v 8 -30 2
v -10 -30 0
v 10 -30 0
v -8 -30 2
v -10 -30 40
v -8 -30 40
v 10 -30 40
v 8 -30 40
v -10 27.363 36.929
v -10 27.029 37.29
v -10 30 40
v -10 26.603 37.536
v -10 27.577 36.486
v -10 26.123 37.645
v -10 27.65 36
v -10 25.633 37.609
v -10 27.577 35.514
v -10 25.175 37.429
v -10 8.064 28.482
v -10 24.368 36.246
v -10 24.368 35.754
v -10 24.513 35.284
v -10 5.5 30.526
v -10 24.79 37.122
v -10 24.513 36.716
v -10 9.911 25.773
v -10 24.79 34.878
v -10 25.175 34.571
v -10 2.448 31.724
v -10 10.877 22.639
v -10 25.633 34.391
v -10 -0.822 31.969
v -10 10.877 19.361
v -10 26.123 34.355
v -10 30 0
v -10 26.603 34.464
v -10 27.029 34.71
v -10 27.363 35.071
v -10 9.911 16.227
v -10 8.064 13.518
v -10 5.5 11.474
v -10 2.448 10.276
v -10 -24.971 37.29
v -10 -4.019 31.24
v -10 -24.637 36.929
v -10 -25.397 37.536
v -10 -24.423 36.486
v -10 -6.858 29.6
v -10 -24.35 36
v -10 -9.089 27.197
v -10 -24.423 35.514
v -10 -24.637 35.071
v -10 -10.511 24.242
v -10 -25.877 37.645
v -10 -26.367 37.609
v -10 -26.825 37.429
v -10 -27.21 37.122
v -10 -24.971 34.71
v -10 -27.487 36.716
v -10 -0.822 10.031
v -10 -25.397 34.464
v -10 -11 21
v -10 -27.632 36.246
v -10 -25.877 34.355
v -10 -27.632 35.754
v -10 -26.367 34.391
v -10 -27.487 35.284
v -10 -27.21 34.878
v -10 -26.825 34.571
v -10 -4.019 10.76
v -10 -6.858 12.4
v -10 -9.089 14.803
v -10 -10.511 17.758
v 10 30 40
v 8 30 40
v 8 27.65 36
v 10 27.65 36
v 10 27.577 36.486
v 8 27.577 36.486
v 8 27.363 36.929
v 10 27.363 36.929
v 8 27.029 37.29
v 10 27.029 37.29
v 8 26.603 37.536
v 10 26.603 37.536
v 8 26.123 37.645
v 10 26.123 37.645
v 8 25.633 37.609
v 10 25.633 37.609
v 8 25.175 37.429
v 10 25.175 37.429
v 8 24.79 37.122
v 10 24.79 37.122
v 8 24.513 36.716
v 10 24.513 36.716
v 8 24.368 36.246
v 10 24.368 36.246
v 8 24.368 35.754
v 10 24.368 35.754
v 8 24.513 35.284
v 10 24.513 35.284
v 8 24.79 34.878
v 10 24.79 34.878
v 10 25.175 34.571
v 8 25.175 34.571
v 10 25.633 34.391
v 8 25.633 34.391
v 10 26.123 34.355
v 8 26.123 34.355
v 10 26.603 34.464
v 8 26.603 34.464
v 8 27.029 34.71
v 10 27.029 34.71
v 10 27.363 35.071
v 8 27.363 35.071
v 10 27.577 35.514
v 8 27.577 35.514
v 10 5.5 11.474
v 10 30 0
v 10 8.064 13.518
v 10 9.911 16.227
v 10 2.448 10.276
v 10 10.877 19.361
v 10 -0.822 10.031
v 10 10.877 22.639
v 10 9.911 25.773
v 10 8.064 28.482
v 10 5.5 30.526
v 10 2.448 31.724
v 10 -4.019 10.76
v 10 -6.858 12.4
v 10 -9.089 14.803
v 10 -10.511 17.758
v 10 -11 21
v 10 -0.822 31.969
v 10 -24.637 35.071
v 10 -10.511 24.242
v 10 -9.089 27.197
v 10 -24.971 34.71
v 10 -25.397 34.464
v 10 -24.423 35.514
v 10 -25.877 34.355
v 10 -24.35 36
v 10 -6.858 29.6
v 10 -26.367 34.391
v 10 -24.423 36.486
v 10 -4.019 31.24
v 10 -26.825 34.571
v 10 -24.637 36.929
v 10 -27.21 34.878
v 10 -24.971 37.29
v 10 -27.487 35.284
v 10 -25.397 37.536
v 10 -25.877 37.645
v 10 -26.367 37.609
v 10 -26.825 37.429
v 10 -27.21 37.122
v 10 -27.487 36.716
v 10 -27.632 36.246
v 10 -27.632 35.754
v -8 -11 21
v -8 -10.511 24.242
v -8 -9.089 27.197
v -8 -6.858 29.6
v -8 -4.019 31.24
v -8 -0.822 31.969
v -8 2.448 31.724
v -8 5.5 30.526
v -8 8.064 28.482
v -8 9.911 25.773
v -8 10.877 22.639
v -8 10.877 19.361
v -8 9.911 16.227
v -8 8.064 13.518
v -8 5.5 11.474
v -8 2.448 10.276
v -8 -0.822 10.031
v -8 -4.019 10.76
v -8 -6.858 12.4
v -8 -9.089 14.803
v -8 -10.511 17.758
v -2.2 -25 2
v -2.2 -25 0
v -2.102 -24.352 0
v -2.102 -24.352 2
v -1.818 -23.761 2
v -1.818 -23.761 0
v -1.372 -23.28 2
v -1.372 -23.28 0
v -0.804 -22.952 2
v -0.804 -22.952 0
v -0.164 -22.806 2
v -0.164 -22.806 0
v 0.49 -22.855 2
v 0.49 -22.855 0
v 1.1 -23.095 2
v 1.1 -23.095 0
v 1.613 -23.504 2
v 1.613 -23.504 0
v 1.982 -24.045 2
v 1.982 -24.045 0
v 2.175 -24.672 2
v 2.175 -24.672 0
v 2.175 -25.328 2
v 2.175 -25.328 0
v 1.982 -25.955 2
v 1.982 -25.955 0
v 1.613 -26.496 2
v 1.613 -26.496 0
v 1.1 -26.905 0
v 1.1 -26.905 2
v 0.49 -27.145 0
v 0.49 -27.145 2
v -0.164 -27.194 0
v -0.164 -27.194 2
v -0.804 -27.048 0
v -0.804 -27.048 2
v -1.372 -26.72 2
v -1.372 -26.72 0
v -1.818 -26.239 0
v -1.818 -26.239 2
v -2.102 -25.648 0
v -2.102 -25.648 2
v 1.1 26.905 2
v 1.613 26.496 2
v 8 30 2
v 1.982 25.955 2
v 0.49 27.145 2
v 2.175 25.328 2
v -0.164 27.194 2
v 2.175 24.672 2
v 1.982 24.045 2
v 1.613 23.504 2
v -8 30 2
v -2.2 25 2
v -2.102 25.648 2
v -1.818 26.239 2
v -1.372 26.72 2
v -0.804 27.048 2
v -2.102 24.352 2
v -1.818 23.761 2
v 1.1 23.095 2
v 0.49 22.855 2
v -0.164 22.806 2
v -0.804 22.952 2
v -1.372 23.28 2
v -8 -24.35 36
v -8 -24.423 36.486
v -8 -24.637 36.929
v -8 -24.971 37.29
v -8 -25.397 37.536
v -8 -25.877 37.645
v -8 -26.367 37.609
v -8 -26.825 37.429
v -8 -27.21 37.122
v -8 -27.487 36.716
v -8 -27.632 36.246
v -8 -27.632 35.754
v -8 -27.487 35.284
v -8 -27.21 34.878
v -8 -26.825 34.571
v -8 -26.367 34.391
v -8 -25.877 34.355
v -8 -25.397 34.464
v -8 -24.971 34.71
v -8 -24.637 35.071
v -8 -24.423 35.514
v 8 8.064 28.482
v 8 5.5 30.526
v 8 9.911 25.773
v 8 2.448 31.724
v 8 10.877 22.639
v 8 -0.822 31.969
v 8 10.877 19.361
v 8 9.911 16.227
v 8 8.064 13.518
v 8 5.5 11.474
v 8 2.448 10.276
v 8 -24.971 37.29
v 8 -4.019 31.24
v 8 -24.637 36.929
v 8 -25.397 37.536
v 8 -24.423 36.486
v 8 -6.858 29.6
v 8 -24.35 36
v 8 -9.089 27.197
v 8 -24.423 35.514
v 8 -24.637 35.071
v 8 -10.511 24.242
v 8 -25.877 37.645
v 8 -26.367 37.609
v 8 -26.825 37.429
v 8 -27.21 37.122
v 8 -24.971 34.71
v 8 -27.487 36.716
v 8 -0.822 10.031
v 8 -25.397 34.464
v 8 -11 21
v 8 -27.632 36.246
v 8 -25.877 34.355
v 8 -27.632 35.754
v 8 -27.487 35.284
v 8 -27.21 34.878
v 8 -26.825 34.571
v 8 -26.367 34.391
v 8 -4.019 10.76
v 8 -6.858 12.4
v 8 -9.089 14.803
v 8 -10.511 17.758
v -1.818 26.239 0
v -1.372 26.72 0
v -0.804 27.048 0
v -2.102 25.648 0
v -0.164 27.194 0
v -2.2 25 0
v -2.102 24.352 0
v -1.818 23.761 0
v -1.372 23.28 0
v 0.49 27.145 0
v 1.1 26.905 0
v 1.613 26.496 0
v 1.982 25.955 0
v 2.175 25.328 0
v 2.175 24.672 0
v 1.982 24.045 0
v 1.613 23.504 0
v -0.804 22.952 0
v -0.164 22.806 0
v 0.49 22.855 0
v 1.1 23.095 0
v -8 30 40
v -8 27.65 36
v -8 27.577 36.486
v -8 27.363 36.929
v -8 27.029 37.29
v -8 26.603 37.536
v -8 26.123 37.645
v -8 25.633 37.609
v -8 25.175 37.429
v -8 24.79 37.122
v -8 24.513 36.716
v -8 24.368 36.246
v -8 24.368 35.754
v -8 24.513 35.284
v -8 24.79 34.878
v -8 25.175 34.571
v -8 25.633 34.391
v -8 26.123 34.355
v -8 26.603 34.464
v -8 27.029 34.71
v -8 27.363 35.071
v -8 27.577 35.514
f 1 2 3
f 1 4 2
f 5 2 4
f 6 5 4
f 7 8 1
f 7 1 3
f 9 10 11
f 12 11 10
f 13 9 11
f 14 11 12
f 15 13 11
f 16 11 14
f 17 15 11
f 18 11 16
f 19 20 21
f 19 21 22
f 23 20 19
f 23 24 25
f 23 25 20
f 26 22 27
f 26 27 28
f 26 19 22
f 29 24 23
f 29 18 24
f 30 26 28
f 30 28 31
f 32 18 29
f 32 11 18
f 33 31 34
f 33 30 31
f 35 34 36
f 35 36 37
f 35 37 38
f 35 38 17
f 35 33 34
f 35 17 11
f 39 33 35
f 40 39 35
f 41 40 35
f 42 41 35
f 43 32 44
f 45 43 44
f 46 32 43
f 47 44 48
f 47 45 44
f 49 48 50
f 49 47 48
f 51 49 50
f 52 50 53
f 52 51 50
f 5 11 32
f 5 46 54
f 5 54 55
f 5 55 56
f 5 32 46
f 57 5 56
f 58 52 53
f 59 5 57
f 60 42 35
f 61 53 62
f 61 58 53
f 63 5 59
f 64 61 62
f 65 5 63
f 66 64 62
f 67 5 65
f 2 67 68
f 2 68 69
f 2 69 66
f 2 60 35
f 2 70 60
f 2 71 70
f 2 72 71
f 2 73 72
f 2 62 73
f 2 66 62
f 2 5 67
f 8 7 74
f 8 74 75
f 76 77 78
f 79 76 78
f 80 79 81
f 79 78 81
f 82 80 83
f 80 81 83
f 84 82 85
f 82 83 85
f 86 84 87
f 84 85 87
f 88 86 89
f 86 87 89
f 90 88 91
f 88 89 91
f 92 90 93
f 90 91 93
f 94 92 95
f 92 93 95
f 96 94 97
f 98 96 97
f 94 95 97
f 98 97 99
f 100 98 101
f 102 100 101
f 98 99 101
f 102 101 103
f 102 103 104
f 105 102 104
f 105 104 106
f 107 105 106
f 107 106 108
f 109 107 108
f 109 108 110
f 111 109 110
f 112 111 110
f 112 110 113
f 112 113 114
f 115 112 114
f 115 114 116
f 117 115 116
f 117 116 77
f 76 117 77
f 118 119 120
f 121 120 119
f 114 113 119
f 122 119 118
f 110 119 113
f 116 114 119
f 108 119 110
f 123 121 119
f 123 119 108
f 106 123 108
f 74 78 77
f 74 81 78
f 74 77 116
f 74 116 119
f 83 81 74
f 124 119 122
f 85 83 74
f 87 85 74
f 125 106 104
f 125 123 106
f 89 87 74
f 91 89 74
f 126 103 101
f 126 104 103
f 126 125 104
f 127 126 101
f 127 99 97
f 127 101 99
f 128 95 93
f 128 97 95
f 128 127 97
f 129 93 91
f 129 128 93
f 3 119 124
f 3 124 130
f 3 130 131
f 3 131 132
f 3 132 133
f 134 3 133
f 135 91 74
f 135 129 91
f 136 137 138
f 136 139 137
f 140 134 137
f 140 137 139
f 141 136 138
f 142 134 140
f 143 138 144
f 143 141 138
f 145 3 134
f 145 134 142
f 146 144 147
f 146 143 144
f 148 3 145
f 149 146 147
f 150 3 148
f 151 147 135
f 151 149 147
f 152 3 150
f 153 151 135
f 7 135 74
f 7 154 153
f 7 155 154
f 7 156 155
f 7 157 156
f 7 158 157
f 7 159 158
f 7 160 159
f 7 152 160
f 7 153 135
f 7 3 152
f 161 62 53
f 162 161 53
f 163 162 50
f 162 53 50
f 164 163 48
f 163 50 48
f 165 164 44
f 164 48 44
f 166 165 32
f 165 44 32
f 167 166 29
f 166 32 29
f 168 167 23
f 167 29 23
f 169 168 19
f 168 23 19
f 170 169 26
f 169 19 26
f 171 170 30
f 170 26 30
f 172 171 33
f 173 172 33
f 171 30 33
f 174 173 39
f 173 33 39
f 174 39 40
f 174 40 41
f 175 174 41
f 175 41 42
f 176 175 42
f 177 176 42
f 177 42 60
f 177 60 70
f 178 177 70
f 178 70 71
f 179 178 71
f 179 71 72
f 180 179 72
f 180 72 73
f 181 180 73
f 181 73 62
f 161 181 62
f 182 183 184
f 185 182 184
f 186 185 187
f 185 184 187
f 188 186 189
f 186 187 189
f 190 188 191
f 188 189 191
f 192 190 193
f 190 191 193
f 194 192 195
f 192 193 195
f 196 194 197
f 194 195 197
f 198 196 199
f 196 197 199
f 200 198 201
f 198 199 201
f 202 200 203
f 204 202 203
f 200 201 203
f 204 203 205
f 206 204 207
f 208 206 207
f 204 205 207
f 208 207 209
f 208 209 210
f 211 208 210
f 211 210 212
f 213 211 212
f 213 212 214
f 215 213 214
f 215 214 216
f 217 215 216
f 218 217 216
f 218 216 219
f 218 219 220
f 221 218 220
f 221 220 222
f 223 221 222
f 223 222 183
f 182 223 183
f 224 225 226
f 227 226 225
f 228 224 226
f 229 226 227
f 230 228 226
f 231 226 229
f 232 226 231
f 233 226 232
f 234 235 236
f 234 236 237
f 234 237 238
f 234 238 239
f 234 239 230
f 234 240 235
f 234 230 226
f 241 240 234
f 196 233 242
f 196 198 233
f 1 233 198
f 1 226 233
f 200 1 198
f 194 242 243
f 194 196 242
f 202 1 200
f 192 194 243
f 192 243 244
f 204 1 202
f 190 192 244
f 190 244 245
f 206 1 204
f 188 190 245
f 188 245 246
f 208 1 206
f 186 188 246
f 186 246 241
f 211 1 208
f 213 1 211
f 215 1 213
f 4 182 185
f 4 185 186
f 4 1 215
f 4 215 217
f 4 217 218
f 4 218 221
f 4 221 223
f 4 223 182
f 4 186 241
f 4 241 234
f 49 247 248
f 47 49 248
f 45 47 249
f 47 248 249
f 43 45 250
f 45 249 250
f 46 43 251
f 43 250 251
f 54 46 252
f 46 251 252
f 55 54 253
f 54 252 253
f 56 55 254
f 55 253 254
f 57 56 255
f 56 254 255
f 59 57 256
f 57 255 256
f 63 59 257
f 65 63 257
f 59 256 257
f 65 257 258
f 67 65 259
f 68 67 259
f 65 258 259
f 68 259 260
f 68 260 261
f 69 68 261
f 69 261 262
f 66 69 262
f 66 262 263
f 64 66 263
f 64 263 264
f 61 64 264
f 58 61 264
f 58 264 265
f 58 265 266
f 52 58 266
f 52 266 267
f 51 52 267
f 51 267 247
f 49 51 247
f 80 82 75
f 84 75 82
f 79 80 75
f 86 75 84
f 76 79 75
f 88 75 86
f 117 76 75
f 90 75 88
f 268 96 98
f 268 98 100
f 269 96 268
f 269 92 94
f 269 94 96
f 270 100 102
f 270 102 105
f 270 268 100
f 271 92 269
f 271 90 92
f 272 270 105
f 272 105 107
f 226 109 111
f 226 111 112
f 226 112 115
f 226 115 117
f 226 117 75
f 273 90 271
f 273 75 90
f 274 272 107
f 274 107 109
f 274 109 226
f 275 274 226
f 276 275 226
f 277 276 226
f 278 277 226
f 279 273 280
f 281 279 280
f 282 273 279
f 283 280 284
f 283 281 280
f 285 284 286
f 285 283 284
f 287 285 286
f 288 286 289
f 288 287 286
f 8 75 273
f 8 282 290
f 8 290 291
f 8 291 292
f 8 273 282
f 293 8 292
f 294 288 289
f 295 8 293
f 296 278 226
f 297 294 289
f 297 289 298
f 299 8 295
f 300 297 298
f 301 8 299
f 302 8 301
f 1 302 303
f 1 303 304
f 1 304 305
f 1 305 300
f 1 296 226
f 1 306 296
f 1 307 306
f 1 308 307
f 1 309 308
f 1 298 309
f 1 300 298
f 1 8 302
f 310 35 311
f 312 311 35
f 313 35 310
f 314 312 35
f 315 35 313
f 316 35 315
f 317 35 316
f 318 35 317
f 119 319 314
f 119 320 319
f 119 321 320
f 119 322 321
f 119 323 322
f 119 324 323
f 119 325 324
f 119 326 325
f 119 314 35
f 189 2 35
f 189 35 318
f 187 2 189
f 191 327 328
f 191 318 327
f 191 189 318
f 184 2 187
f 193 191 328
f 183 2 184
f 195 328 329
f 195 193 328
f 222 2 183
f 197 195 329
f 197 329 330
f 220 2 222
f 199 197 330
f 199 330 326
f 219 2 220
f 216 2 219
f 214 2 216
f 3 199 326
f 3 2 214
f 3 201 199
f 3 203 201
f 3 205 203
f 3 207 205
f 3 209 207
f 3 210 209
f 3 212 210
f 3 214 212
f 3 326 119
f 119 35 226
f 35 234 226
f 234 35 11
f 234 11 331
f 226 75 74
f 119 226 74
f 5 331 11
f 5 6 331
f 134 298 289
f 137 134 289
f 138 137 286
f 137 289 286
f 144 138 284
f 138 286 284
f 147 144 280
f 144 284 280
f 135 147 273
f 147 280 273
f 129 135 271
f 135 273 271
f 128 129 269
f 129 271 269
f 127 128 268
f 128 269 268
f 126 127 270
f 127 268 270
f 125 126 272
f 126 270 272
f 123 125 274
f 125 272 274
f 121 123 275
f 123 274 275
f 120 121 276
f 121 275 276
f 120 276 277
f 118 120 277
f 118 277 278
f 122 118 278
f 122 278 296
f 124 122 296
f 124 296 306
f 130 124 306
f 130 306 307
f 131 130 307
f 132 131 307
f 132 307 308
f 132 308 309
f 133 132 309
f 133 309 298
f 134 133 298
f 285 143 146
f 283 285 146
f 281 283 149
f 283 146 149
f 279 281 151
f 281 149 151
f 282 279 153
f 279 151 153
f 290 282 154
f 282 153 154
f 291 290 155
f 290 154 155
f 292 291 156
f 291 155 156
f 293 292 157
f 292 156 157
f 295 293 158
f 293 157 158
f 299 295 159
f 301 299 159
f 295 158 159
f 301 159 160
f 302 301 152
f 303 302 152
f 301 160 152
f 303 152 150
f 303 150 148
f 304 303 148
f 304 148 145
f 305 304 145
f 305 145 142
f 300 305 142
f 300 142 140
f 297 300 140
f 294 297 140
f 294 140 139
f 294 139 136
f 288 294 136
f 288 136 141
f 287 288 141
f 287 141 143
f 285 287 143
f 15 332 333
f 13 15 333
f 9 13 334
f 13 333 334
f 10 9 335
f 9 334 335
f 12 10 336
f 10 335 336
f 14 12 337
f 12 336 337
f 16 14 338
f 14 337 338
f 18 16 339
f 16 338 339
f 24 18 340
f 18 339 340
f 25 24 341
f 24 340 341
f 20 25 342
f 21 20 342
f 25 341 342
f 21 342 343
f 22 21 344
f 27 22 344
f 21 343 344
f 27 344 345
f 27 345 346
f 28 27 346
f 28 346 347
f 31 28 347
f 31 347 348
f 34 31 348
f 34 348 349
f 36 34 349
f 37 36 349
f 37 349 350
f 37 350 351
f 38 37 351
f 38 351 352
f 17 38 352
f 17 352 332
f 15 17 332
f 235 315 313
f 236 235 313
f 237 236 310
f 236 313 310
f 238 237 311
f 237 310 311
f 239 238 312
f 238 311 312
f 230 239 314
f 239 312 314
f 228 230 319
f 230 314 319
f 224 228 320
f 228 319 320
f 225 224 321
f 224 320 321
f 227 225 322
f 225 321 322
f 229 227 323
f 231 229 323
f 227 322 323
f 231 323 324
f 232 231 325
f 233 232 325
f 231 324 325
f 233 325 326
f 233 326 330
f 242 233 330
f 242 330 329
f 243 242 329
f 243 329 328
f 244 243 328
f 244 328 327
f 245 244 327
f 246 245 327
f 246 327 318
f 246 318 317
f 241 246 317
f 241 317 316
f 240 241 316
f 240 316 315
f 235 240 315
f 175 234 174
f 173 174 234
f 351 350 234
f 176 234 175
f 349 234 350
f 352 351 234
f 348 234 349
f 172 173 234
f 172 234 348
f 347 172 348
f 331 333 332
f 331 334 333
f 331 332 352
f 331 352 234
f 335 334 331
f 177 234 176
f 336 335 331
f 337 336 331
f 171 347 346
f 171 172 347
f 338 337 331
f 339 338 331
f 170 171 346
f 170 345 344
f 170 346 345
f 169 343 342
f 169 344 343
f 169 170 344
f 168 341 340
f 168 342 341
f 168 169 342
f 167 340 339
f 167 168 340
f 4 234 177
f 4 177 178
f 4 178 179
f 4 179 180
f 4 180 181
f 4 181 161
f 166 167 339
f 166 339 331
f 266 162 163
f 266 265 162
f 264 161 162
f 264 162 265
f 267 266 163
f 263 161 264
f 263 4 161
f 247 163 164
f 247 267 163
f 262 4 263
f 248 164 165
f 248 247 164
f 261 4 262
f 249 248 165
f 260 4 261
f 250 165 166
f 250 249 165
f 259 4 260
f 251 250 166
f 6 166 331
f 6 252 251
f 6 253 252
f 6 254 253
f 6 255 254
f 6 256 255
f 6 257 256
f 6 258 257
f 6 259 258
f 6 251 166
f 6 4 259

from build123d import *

# Parameters (mm, degrees)
F1_DEPTH = 30
F2_R     = 11
F3_DEPTH = 20
F5_D     = 4.4
F6_D     = 3.3


with BuildPart() as f1:
    # F0 (on Front) → F1 (new body, symmetric)
    with BuildSketch(Plane.XZ):
        Polygon((-8, 40), (-10, 40), (-10, 0), (0, 0), (10, 0), (10, 40), (8, 40), (8, 2), (0, 2), (-8, 2), align=None)
    extrude(amount=F1_DEPTH, both=True)

    # F2 (on face) → F3 (cut, through all)
    with BuildSketch(Plane(origin=(-10, 0, 0), x_dir=(0, -1, 0), z_dir=(-1, 0, 0))):
        with Locations((0, 21)):
            Circle(F2_R)
    extrude(amount=-F3_DEPTH, mode=Mode.SUBTRACT)

    # F5 (through all)
    with Locations(Plane.XY.offset(2)):
        with Locations((0, 25), (0, -25)):
            Hole(F5_D / 2)

    # F6 (through all)
    with Locations(Plane(origin=(-10, 0, 0), x_dir=(0, -1, 0), z_dir=(-1, 0, 0))):
        with Locations((-26, 36), (26, 36)):
            Hole(F6_D / 2)


solid = f1.part
